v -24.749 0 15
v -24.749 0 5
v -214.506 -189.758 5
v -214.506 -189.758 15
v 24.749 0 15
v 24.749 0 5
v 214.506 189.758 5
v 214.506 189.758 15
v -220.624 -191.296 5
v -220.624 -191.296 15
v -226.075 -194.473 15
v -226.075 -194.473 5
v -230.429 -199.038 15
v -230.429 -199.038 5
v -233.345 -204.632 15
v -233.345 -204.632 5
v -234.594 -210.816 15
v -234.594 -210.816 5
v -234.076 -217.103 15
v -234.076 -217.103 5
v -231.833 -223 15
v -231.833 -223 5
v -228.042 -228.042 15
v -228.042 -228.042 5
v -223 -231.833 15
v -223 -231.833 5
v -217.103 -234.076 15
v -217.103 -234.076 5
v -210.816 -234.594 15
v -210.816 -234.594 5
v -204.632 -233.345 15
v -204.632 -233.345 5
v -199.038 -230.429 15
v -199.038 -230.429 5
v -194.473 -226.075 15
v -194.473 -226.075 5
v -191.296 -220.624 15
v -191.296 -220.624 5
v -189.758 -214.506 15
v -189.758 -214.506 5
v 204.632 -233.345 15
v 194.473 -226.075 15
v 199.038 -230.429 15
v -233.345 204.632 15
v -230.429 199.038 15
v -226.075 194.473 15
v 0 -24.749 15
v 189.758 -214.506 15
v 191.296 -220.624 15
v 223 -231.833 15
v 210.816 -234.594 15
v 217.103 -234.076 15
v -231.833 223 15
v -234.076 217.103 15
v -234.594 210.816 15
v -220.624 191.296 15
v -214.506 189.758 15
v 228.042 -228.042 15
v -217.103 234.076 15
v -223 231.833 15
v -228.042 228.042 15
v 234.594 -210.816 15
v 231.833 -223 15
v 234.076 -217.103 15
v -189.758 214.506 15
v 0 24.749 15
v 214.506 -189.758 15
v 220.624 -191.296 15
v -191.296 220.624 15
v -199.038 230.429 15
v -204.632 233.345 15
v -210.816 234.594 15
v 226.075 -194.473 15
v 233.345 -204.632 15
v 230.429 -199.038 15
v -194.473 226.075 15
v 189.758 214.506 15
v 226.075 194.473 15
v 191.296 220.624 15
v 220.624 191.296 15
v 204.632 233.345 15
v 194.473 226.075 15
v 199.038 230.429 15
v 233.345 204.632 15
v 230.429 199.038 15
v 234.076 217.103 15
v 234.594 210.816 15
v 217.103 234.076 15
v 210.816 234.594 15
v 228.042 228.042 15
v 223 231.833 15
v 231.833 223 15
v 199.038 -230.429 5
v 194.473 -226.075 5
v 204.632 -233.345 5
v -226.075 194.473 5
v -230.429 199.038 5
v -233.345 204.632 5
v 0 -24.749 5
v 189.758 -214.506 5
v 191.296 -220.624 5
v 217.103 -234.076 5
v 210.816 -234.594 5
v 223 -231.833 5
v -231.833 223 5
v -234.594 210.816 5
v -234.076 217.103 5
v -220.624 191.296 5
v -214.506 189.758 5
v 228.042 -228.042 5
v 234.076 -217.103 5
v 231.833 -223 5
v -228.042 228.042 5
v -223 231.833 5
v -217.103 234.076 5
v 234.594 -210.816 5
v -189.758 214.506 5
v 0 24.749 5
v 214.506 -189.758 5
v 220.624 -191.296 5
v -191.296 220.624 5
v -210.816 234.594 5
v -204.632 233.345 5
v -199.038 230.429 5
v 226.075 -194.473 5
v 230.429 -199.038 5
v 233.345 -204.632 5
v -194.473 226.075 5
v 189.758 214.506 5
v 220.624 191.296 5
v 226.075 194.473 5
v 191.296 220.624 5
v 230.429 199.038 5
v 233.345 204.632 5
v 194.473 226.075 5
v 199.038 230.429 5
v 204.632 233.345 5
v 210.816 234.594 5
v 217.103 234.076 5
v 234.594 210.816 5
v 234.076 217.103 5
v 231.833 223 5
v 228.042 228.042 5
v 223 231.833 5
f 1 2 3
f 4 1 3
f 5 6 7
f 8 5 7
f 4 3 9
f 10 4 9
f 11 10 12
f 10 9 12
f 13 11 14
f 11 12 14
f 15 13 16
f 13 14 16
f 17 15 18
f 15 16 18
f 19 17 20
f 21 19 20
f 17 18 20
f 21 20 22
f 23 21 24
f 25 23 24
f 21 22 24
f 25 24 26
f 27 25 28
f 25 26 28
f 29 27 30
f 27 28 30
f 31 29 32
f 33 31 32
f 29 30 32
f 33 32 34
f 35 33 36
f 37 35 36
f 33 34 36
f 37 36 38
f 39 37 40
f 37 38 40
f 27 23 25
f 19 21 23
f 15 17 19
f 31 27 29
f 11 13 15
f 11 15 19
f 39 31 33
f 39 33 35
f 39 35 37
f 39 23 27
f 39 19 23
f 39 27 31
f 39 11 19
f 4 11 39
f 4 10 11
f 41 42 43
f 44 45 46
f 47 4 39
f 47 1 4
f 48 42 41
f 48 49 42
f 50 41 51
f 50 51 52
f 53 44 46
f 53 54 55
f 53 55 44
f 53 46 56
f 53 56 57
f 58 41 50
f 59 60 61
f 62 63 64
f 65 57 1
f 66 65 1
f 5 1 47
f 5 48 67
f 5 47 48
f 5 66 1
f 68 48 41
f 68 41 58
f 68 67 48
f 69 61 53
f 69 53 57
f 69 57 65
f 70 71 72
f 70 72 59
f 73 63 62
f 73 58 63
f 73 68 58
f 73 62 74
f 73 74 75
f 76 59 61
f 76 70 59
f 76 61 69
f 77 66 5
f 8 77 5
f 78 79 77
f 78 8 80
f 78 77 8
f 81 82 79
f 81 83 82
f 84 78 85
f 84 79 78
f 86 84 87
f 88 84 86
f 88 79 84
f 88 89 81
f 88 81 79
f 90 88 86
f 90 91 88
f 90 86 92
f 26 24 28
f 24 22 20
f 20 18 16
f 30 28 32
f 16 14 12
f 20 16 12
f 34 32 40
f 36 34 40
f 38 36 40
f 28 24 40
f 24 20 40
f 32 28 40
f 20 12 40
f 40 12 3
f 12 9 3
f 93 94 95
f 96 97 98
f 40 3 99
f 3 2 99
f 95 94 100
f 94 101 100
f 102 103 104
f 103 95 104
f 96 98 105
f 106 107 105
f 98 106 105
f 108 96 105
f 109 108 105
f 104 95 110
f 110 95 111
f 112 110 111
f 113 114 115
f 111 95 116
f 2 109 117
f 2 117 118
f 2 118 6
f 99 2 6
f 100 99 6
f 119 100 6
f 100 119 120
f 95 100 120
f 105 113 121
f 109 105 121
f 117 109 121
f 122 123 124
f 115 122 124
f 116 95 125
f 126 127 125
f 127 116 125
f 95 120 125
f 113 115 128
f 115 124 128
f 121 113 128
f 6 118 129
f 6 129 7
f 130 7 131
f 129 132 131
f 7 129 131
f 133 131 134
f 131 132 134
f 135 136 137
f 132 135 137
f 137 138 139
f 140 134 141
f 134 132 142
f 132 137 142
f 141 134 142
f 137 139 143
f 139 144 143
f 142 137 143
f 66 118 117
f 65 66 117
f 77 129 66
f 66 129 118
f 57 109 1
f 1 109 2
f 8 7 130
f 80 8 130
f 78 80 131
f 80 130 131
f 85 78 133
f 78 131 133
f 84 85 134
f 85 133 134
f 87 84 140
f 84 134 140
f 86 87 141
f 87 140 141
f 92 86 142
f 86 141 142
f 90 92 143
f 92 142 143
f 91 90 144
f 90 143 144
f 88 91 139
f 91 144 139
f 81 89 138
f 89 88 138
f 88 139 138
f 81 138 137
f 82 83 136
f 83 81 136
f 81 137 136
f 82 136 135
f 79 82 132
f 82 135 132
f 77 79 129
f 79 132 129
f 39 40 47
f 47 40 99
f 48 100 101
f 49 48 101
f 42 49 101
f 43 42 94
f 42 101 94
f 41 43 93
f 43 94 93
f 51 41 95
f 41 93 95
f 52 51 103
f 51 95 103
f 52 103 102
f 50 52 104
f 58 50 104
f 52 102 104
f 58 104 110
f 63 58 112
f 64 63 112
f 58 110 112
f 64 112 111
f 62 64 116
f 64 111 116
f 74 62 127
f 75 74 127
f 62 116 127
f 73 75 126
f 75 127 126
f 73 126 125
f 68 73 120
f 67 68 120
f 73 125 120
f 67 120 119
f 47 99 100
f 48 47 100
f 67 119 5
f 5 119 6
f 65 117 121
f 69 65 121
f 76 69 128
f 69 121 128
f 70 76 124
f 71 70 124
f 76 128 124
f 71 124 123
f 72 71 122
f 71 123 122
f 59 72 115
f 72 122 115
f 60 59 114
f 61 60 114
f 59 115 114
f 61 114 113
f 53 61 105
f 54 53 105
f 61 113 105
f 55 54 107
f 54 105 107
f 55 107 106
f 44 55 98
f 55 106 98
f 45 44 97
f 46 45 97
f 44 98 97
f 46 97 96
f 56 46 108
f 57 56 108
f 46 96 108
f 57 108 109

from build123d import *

# Parameters (mm, degrees)
PAD_DEPTH    = 10
PAD001_DEPTH = 10
PAD002_DEPTH = 10
PAD003_DEPTH = 10
SKETCH002_R  = 22.5
PAD004_DEPTH = 10


with BuildPart() as part:
    # Sketch005 → Pad (new body)
    with BuildSketch(Plane(origin=(0, 0, 5), x_dir=(0, -1, 0), z_dir=(0, 0, 1))):
        Polygon((12.374369, -12.374369), (224.506403, 199.757666), (199.757666, 224.506403), (-12.374369, 12.374369), align=None)
    extrude(amount=PAD_DEPTH)

    # Sketch004 → Pad001 (join)
    with BuildSketch(Plane(origin=(0, 0, 5), x_dir=(-1, 0, 0), z_dir=(0, 0, 1))):
        Polygon((12.374369, -12.374369), (224.506403, 199.757666), (199.757666, 224.506403), (-12.374369, 12.374369), align=None)
    extrude(amount=PAD001_DEPTH)

    # Sketch001 → Pad002 (join)
    with BuildSketch(Plane.XY.offset(5)):
        Polygon((12.374369, -12.374369), (224.506403, 199.757666), (199.757666, 224.506403), (-12.374369, 12.374369), align=None)
    extrude(amount=PAD002_DEPTH)

    # Sketch003 → Pad003 (join)
    with BuildSketch(Plane(origin=(0, 0, 5), x_dir=(0, 1, 0), z_dir=(0, 0, 1))):
        Polygon((12.374369, -12.374369), (224.506403, 199.757666), (199.757666, 224.506403), (-12.374369, 12.374369), align=None)
    extrude(amount=PAD003_DEPTH)

    # Sketch002 → Pad004 (join)
    with BuildSketch(Plane.XY.offset(5)):
        with Locations((212.132034, 212.132034)):
            Circle(SKETCH002_R)
        with Locations((212.132034, -212.132034)):
            Circle(SKETCH002_R)
        with Locations((-212.132034, -212.132034)):
            Circle(SKETCH002_R)
        with Locations((-212.132034, 212.132034)):
            Circle(SKETCH002_R)
    extrude(amount=PAD004_DEPTH)


solid = part.part
